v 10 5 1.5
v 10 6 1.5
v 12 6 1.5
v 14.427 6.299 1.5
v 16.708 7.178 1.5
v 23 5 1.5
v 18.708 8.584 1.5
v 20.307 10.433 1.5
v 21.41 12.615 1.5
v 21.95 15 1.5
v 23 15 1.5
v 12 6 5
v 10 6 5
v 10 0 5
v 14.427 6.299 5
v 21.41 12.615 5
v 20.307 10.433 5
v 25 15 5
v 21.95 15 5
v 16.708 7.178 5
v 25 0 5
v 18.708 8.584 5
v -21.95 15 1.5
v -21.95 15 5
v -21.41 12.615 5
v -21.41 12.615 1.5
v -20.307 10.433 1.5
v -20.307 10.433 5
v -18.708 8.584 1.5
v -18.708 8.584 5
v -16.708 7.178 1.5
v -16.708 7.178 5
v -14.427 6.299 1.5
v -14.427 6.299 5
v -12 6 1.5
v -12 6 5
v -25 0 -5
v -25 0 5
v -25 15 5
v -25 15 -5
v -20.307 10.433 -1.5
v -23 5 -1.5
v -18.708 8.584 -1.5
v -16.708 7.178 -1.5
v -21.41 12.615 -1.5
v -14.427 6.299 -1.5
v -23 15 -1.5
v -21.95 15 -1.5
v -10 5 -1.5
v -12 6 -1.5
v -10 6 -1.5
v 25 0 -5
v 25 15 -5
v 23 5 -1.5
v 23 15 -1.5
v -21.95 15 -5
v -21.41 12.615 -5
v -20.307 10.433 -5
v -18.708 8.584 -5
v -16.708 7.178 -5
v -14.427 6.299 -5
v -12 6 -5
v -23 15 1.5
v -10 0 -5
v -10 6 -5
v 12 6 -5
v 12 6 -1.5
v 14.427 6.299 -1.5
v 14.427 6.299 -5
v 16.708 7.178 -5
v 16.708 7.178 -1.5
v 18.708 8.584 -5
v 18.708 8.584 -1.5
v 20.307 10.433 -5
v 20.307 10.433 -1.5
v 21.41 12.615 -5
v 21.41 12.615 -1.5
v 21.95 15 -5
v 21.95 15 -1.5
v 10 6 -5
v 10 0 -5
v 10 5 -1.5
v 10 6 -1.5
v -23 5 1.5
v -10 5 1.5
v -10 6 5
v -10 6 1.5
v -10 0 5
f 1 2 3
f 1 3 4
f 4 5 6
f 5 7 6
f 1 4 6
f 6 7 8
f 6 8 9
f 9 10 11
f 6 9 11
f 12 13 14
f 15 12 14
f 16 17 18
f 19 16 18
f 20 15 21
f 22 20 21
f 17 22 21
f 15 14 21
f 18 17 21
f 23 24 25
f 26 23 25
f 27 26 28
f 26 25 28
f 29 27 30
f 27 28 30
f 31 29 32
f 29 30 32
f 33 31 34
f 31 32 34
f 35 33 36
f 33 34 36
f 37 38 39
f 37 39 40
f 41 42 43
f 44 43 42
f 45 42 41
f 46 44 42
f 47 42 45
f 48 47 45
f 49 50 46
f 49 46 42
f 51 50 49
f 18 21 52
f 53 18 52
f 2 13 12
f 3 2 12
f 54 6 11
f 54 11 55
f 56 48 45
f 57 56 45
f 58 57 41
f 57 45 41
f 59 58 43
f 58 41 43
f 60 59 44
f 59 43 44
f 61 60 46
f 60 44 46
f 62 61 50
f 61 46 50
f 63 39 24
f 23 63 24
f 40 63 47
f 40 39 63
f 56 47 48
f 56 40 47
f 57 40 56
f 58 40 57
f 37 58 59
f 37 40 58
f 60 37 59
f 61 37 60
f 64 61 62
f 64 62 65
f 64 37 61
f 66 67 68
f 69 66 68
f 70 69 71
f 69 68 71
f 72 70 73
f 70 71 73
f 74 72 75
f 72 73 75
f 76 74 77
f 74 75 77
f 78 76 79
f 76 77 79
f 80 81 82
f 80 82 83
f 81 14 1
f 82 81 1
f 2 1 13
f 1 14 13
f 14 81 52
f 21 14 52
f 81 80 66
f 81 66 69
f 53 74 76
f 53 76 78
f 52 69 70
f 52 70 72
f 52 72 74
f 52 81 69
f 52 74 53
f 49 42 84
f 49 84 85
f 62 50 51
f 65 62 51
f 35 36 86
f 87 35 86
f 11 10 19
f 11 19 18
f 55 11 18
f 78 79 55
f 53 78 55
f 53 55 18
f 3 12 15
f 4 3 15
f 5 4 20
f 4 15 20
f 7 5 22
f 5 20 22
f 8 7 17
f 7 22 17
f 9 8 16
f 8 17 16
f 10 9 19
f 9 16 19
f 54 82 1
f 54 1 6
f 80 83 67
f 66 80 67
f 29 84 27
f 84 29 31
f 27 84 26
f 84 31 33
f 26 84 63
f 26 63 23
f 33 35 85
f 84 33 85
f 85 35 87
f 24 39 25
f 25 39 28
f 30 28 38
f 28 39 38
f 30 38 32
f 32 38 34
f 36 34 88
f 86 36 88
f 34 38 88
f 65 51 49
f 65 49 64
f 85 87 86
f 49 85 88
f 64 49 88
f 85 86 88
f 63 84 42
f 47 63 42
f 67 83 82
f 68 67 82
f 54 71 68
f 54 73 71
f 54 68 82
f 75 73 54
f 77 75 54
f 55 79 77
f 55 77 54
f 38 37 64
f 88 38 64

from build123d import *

# Parameters (mm, degrees)
SKETCH1_W           = 50
SKETCH1_H           = 10
BOSS_EXTRUDE1_DEPTH = 15
SKETCH3_W           = 46
SKETCH3_H           = 3
CUT_EXTRUDE1_DEPTH  = 10
CUT_EXTRUDE2_DEPTH  = 10


with BuildPart() as part:
    # Sketch1 → Boss-Extrude1 (new body)
    with BuildSketch(Plane(origin=(0, 0, 0), x_dir=(1, 0, 0), z_dir=(0, 1, 0))):
        Rectangle(SKETCH1_W, SKETCH1_H)
    extrude(amount=BOSS_EXTRUDE1_DEPTH)

    # Sketch3 → Cut-Extrude1 (cut)
    with BuildSketch(Plane(origin=(0, 15, 0), x_dir=(1, 0, 0), z_dir=(0, 1, 0))):
        Rectangle(SKETCH3_W, SKETCH3_H)
    extrude(amount=-CUT_EXTRUDE1_DEPTH, mode=Mode.SUBTRACT)

    # Sketch4 → Cut-Extrude2 (cut)
    with BuildSketch(Plane.XY.offset(5)):
        with BuildLine():
            Line((-10, 6), (-10, 0))
            Line((-10, 0), (10, 0))
            Line((10, 0), (10, 6))
            Line((10, 6), (12, 6))
            ThreePointArc((12, 6), (18.708203932, 8.583801513), (21.949874371, 15))
            Line((21.949874371, 15), (-21.949874371, 15))
            ThreePointArc((-21.949874371, 15), (-18.708203932, 8.583801513), (-12, 6))
            Line((-12, 6), (-10, 6))
        make_face()
    extrude(amount=-CUT_EXTRUDE2_DEPTH, mode=Mode.SUBTRACT)


with BuildPart() as cut_extrude2_piece_1:
    # of the separate pieces the step leaves, piece 1, a body of its own (cut_extrude2_pieces)
    add(part.part.solids().sort_by_distance((-25, 0, 5))[0])


with BuildPart() as cut_extrude2_piece_2:
    # of the separate pieces the step leaves, piece 2, a body of its own (cut_extrude2_pieces)
    add(part.part.solids().sort_by_distance((10, 0, 5))[0])


solid = Compound([cut_extrude2_piece_1.part, cut_extrude2_piece_2.part])
